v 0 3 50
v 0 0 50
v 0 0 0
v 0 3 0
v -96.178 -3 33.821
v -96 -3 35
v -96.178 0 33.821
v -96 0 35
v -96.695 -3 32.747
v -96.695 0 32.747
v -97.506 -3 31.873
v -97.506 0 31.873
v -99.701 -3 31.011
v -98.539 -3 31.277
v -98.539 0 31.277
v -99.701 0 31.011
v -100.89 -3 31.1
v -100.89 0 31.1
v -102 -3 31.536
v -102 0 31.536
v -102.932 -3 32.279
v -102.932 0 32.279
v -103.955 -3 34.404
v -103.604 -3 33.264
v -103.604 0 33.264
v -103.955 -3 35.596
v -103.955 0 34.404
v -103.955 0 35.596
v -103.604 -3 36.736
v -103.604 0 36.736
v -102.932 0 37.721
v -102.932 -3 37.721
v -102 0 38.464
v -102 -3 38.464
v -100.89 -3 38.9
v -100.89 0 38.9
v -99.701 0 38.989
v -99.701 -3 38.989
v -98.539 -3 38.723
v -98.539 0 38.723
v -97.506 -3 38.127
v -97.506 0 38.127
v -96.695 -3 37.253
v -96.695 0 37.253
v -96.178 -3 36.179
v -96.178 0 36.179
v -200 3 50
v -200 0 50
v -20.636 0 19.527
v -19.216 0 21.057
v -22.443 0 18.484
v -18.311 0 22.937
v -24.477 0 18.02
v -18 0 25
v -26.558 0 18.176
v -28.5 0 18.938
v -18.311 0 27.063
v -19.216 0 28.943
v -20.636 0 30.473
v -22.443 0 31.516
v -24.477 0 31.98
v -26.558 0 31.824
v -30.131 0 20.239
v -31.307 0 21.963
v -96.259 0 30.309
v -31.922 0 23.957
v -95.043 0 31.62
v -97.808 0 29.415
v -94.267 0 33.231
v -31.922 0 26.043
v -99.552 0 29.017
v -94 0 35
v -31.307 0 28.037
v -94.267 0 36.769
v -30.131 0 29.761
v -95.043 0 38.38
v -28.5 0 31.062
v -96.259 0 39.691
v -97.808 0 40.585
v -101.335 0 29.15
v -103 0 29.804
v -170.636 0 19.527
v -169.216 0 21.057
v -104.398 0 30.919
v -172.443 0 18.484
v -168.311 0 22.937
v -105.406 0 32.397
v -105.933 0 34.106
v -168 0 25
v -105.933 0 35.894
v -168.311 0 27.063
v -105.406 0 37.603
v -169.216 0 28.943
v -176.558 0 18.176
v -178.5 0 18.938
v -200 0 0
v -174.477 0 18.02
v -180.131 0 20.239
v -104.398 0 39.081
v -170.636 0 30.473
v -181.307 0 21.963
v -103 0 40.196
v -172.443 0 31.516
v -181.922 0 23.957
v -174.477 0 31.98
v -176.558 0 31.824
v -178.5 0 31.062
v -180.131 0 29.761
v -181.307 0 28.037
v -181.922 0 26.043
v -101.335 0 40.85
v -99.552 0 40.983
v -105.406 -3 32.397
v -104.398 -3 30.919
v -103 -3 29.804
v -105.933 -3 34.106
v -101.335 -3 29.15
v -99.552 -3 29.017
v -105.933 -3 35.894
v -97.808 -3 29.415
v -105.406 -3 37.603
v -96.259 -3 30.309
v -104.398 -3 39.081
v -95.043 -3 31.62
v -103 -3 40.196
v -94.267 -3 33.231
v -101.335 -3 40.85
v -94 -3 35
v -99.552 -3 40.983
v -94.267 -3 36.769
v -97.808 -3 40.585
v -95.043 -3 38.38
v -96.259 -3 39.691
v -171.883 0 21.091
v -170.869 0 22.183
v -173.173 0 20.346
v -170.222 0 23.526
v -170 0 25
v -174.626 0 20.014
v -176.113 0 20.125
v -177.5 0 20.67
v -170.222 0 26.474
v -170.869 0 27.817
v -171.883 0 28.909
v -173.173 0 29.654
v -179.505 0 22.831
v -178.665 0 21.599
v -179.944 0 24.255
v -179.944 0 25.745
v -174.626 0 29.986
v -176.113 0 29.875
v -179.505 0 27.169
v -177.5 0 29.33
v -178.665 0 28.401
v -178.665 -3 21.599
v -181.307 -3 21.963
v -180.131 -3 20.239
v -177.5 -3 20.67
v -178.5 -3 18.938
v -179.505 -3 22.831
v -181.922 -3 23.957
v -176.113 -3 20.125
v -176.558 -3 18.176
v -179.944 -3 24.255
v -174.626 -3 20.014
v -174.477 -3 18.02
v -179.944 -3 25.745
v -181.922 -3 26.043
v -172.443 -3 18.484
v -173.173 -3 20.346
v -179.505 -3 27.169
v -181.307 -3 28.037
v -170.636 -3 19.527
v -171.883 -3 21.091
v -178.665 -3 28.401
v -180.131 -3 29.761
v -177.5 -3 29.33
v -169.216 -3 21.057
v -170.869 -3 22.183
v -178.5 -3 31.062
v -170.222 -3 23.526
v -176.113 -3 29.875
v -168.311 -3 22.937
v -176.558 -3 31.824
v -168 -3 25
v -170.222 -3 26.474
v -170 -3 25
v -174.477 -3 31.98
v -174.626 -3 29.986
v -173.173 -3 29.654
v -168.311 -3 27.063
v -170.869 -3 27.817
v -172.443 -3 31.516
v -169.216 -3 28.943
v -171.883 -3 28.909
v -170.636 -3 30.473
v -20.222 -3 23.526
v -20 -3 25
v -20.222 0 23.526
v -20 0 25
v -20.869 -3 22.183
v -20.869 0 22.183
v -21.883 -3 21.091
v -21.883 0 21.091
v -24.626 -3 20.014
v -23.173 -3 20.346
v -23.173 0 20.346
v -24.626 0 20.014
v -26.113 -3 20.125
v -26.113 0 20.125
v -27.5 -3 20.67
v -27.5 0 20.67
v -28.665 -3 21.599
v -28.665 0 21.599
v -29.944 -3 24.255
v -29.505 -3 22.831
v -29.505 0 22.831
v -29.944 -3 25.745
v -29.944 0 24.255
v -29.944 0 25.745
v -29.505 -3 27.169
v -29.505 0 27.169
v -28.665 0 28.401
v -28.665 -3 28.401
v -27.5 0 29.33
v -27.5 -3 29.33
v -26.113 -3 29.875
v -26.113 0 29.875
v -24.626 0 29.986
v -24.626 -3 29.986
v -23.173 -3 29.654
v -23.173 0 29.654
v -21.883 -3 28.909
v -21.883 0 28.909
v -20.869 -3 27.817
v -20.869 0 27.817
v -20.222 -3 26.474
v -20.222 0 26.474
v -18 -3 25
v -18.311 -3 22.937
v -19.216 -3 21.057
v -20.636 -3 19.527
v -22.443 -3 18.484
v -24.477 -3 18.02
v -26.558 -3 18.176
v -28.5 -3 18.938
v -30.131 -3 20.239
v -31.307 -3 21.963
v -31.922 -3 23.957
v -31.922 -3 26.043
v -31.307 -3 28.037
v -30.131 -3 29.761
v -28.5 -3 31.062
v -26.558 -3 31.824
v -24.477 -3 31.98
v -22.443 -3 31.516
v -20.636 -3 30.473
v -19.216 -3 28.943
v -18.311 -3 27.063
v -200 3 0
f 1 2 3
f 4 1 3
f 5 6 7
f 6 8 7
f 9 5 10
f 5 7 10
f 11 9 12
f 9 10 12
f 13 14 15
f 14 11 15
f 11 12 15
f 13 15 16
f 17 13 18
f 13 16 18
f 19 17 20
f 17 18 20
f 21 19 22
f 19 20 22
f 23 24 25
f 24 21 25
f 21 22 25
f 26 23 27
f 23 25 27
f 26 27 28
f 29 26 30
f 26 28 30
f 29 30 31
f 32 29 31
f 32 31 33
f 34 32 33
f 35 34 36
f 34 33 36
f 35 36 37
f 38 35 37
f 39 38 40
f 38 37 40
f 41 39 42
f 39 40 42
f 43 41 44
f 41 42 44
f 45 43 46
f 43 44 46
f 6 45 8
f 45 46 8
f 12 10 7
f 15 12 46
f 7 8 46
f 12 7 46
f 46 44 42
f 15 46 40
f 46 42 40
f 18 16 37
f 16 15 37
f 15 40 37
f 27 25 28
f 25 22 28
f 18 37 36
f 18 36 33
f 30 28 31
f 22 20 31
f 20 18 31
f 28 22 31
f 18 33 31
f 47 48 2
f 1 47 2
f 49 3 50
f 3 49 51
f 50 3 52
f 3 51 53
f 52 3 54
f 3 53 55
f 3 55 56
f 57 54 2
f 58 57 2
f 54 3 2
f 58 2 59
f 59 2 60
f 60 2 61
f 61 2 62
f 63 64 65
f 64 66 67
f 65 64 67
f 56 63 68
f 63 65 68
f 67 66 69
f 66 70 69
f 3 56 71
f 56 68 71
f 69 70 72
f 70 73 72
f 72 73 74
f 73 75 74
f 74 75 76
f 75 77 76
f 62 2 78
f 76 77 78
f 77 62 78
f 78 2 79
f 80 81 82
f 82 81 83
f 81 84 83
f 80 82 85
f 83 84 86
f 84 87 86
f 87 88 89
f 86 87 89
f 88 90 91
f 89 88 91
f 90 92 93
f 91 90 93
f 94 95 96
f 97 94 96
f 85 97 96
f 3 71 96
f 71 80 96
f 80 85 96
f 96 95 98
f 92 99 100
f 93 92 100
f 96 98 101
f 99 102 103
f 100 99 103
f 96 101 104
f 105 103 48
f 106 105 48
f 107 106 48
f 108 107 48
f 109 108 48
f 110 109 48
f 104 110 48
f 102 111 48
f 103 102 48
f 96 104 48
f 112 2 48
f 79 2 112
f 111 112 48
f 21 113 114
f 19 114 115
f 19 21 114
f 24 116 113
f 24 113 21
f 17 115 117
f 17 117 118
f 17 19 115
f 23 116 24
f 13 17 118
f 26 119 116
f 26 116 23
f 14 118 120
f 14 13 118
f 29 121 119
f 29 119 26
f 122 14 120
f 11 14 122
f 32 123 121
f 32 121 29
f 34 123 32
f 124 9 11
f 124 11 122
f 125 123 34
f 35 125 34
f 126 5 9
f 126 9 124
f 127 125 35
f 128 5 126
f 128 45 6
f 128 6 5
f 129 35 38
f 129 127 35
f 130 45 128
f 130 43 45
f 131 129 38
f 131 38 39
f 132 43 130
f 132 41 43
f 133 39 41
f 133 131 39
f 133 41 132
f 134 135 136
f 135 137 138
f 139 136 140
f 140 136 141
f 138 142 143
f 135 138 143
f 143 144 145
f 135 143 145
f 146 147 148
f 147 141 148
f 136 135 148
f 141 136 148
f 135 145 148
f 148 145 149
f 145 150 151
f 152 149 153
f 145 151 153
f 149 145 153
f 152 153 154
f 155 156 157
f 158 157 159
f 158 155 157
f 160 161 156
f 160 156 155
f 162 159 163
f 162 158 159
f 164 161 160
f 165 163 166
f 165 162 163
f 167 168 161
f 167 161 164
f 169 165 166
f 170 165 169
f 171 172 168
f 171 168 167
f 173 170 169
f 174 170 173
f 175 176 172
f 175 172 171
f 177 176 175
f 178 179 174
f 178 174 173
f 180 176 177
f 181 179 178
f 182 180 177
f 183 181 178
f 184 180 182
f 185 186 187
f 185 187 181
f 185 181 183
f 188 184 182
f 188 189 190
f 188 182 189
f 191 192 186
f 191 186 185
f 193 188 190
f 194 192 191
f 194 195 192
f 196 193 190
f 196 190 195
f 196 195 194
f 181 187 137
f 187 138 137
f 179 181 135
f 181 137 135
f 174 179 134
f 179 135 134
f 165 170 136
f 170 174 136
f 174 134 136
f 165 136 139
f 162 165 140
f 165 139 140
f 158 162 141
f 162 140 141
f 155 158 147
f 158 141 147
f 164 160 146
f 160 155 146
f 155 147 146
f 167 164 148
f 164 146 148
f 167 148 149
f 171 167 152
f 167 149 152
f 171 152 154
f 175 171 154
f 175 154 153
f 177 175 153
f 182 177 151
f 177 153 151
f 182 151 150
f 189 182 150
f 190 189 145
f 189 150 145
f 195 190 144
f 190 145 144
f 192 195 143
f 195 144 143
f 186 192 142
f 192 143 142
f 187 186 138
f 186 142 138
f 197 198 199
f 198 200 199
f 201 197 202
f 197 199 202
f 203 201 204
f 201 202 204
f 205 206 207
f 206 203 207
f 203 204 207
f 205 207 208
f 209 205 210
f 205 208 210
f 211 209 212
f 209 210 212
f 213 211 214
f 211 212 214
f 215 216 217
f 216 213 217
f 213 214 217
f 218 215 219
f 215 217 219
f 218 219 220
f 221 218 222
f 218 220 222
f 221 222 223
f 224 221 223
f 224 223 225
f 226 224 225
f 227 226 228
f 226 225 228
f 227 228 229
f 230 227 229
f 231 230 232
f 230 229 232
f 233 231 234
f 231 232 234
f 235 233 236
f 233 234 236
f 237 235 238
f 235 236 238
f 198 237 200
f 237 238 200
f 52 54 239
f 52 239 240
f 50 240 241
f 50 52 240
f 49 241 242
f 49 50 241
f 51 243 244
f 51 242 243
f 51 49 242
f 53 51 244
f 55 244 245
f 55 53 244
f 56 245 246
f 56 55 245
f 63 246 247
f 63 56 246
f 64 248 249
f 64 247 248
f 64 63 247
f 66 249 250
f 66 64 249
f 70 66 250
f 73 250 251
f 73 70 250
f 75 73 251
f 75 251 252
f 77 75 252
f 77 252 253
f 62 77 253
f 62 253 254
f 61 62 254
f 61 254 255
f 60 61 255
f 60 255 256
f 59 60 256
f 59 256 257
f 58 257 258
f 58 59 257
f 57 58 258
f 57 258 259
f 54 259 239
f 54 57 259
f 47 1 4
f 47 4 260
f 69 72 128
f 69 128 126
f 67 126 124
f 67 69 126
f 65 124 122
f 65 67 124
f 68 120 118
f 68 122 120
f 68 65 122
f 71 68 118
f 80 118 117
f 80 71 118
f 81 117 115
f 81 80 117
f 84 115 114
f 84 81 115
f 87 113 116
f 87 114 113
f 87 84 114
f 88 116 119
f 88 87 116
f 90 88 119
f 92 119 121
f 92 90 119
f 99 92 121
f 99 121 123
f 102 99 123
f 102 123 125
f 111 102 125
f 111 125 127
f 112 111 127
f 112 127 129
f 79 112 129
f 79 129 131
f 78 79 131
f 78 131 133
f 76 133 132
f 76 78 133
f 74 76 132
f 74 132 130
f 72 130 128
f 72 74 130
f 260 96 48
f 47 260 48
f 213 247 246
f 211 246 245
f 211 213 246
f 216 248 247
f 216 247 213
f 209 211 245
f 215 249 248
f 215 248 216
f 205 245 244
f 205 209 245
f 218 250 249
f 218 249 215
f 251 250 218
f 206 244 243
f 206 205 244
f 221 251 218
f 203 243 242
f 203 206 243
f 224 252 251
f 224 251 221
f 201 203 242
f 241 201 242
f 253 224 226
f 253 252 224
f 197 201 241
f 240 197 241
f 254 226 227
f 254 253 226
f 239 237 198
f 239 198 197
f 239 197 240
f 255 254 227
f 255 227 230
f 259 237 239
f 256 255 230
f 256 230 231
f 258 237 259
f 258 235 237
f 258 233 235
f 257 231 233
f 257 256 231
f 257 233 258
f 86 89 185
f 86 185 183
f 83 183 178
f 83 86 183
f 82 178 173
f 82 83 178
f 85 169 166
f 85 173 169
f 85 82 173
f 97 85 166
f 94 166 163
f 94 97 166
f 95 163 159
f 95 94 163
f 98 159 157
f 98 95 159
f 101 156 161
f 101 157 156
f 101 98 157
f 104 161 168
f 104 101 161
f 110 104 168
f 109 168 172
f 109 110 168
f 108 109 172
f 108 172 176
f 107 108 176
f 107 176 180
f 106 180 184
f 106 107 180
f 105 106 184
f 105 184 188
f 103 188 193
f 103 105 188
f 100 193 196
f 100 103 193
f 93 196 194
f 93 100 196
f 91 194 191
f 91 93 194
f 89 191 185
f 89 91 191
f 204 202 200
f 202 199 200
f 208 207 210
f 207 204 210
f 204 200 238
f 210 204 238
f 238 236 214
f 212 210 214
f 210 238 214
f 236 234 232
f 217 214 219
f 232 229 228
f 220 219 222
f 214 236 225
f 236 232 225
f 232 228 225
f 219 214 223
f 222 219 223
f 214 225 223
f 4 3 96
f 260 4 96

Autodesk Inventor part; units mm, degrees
ref_plane "YZ Plane" through (0, 0, 0) normal (1, 0, 0) x (0, 1, 0)
ref_plane "XZ Plane" through (0, 0, 0) normal (0, 1, 0) x (-1, 0, 0)
ref_plane "XY Plane" through (0, 0, 0) normal (0, 0, 1) x (1, 0, 0)
sketch "Sketch1" plane through (0, 0, 0) normal (0, 1, 0) x (-1, 0, 0)
  line L0 (0, 0) -> (200, 0)
  line L1 (200, 0) -> (200, 50)
  line L2 (200, 50) -> (0, 50)
  line L3 (0, 50) -> (0, 0)
  line L4 (100, 50) -> (100, -12.2978) construction
  line L5 (100, 46.202) -> (25, 46.202) construction
  line L6 (25, 46.202) -> (25, 4.511) construction
  line L7 (14.6583, 50) -> (14.6583, 25) construction
  line L8 (14.6583, 25) -> (197.0399, 25) construction
  line L9 (110.8785, 50) -> (110.8785, 35) construction
  line L10 (110.8785, 35) -> (88.7756, 35) construction
  dimension "d0" = 200
  dimension "d1" = 50
  dimension "d2" = 75
  dimension "d3" = 25
  dimension "d4" = 15
extrude "Extrusion1" add sketch "Sketch1" along normal blind 3
sketch "Sketch2" plane through (0, 0, 0) normal (0, -1, 0) x (1, 0, 0)
  line L0 (0, 0) -> (-200, 0) projected
  line L1 (-200, 50) -> (0, 50) projected
  line L2 (-200, 0) -> (-200, 50) projected
  line L3 (-100, 50) -> (-100, -20.2581) construction
  line L4 (-200, 25) -> (-5.0979, 25) construction
  line L5 (-100, 50) -> (-100, 35) construction
  line L6 (-100, 35) -> (-80.8703, 35) construction
  line L7 (-100, 35) -> (-119.3164, 35) construction
  line L8 (-190.2363, 50) -> (-190.2363, 25) construction
  line L9 (-100, 0) -> (-175, 0) construction
  line L10 (-175, 0) -> (-175, 41.5169) construction
  line L11 (-100, 0) -> (-25, 0) construction
  line L12 (-25, 0) -> (-25, 41.5169) construction
  circle A0 centre (-100, 35) radius 4
  circle A1 centre (-100, 35) radius 6
  dimension "d7" = 15
  dimension "d8" = 25
  dimension "d9" = 75
  dimension "d10" = 75
  dimension "d11" = 8
  dimension "d12" = 12
extrude "Extrusion2" add sketch "Sketch2" along normal blind 3
sketch "Sketch3" plane through (0, 0, 0) normal (0, -1, 0) x (1, 0, 0)
  line L0 (-200, 50) -> (0, 50) projected
  line L1 (-200, 0) -> (-200, 50) projected
  circle A0 centre (-100, 35) radius 6 projected
  line L2 (-100, 35) -> (-175, 35) construction
  line L3 (-175, 35) -> (-175, -16.3605) construction
  line L4 (-191.9526, 50) -> (-191.9526, 25) construction
  line L5 (-191.9526, 25) -> (-42.7931, 25) construction
  circle A1 centre (-175, 25) radius 5
  circle A2 centre (-175, 25) radius 7
  dimension "d15" = 75
  dimension "d16" = 25
  dimension "d17" = 10
  dimension "d18" = 14
extrude "Extrusion3" add sketch "Sketch3" along normal blind 3 contours A2
sketch "Sketch4" plane through (0, 0, 0) normal (0, -1, 0) x (1, 0, 0)
  circle A0 centre (-100, 35) radius 6 projected
  line L0 (-200, 50) -> (0, 50) projected
  line L1 (-200, 0) -> (-200, 50) projected
  line L2 (-100, 35) -> (-25, 35) construction
  line L3 (-25, 35) -> (-25, -20.2088) construction
  line L4 (-14.8647, 50) -> (-14.8647, 25) construction
  line L5 (-14.8647, 25) -> (-71.3929, 25) construction
  circle A1 centre (-25, 25) radius 5
  circle A2 centre (-25, 25) radius 7
  dimension "d21" = 75
  dimension "d22" = 25
  dimension "d23" = 10
  dimension "d24" = 14
extrude "Extrusion4" add sketch "Sketch4" along normal blind 3 contours A2
properties part number "z rods top bracket"
